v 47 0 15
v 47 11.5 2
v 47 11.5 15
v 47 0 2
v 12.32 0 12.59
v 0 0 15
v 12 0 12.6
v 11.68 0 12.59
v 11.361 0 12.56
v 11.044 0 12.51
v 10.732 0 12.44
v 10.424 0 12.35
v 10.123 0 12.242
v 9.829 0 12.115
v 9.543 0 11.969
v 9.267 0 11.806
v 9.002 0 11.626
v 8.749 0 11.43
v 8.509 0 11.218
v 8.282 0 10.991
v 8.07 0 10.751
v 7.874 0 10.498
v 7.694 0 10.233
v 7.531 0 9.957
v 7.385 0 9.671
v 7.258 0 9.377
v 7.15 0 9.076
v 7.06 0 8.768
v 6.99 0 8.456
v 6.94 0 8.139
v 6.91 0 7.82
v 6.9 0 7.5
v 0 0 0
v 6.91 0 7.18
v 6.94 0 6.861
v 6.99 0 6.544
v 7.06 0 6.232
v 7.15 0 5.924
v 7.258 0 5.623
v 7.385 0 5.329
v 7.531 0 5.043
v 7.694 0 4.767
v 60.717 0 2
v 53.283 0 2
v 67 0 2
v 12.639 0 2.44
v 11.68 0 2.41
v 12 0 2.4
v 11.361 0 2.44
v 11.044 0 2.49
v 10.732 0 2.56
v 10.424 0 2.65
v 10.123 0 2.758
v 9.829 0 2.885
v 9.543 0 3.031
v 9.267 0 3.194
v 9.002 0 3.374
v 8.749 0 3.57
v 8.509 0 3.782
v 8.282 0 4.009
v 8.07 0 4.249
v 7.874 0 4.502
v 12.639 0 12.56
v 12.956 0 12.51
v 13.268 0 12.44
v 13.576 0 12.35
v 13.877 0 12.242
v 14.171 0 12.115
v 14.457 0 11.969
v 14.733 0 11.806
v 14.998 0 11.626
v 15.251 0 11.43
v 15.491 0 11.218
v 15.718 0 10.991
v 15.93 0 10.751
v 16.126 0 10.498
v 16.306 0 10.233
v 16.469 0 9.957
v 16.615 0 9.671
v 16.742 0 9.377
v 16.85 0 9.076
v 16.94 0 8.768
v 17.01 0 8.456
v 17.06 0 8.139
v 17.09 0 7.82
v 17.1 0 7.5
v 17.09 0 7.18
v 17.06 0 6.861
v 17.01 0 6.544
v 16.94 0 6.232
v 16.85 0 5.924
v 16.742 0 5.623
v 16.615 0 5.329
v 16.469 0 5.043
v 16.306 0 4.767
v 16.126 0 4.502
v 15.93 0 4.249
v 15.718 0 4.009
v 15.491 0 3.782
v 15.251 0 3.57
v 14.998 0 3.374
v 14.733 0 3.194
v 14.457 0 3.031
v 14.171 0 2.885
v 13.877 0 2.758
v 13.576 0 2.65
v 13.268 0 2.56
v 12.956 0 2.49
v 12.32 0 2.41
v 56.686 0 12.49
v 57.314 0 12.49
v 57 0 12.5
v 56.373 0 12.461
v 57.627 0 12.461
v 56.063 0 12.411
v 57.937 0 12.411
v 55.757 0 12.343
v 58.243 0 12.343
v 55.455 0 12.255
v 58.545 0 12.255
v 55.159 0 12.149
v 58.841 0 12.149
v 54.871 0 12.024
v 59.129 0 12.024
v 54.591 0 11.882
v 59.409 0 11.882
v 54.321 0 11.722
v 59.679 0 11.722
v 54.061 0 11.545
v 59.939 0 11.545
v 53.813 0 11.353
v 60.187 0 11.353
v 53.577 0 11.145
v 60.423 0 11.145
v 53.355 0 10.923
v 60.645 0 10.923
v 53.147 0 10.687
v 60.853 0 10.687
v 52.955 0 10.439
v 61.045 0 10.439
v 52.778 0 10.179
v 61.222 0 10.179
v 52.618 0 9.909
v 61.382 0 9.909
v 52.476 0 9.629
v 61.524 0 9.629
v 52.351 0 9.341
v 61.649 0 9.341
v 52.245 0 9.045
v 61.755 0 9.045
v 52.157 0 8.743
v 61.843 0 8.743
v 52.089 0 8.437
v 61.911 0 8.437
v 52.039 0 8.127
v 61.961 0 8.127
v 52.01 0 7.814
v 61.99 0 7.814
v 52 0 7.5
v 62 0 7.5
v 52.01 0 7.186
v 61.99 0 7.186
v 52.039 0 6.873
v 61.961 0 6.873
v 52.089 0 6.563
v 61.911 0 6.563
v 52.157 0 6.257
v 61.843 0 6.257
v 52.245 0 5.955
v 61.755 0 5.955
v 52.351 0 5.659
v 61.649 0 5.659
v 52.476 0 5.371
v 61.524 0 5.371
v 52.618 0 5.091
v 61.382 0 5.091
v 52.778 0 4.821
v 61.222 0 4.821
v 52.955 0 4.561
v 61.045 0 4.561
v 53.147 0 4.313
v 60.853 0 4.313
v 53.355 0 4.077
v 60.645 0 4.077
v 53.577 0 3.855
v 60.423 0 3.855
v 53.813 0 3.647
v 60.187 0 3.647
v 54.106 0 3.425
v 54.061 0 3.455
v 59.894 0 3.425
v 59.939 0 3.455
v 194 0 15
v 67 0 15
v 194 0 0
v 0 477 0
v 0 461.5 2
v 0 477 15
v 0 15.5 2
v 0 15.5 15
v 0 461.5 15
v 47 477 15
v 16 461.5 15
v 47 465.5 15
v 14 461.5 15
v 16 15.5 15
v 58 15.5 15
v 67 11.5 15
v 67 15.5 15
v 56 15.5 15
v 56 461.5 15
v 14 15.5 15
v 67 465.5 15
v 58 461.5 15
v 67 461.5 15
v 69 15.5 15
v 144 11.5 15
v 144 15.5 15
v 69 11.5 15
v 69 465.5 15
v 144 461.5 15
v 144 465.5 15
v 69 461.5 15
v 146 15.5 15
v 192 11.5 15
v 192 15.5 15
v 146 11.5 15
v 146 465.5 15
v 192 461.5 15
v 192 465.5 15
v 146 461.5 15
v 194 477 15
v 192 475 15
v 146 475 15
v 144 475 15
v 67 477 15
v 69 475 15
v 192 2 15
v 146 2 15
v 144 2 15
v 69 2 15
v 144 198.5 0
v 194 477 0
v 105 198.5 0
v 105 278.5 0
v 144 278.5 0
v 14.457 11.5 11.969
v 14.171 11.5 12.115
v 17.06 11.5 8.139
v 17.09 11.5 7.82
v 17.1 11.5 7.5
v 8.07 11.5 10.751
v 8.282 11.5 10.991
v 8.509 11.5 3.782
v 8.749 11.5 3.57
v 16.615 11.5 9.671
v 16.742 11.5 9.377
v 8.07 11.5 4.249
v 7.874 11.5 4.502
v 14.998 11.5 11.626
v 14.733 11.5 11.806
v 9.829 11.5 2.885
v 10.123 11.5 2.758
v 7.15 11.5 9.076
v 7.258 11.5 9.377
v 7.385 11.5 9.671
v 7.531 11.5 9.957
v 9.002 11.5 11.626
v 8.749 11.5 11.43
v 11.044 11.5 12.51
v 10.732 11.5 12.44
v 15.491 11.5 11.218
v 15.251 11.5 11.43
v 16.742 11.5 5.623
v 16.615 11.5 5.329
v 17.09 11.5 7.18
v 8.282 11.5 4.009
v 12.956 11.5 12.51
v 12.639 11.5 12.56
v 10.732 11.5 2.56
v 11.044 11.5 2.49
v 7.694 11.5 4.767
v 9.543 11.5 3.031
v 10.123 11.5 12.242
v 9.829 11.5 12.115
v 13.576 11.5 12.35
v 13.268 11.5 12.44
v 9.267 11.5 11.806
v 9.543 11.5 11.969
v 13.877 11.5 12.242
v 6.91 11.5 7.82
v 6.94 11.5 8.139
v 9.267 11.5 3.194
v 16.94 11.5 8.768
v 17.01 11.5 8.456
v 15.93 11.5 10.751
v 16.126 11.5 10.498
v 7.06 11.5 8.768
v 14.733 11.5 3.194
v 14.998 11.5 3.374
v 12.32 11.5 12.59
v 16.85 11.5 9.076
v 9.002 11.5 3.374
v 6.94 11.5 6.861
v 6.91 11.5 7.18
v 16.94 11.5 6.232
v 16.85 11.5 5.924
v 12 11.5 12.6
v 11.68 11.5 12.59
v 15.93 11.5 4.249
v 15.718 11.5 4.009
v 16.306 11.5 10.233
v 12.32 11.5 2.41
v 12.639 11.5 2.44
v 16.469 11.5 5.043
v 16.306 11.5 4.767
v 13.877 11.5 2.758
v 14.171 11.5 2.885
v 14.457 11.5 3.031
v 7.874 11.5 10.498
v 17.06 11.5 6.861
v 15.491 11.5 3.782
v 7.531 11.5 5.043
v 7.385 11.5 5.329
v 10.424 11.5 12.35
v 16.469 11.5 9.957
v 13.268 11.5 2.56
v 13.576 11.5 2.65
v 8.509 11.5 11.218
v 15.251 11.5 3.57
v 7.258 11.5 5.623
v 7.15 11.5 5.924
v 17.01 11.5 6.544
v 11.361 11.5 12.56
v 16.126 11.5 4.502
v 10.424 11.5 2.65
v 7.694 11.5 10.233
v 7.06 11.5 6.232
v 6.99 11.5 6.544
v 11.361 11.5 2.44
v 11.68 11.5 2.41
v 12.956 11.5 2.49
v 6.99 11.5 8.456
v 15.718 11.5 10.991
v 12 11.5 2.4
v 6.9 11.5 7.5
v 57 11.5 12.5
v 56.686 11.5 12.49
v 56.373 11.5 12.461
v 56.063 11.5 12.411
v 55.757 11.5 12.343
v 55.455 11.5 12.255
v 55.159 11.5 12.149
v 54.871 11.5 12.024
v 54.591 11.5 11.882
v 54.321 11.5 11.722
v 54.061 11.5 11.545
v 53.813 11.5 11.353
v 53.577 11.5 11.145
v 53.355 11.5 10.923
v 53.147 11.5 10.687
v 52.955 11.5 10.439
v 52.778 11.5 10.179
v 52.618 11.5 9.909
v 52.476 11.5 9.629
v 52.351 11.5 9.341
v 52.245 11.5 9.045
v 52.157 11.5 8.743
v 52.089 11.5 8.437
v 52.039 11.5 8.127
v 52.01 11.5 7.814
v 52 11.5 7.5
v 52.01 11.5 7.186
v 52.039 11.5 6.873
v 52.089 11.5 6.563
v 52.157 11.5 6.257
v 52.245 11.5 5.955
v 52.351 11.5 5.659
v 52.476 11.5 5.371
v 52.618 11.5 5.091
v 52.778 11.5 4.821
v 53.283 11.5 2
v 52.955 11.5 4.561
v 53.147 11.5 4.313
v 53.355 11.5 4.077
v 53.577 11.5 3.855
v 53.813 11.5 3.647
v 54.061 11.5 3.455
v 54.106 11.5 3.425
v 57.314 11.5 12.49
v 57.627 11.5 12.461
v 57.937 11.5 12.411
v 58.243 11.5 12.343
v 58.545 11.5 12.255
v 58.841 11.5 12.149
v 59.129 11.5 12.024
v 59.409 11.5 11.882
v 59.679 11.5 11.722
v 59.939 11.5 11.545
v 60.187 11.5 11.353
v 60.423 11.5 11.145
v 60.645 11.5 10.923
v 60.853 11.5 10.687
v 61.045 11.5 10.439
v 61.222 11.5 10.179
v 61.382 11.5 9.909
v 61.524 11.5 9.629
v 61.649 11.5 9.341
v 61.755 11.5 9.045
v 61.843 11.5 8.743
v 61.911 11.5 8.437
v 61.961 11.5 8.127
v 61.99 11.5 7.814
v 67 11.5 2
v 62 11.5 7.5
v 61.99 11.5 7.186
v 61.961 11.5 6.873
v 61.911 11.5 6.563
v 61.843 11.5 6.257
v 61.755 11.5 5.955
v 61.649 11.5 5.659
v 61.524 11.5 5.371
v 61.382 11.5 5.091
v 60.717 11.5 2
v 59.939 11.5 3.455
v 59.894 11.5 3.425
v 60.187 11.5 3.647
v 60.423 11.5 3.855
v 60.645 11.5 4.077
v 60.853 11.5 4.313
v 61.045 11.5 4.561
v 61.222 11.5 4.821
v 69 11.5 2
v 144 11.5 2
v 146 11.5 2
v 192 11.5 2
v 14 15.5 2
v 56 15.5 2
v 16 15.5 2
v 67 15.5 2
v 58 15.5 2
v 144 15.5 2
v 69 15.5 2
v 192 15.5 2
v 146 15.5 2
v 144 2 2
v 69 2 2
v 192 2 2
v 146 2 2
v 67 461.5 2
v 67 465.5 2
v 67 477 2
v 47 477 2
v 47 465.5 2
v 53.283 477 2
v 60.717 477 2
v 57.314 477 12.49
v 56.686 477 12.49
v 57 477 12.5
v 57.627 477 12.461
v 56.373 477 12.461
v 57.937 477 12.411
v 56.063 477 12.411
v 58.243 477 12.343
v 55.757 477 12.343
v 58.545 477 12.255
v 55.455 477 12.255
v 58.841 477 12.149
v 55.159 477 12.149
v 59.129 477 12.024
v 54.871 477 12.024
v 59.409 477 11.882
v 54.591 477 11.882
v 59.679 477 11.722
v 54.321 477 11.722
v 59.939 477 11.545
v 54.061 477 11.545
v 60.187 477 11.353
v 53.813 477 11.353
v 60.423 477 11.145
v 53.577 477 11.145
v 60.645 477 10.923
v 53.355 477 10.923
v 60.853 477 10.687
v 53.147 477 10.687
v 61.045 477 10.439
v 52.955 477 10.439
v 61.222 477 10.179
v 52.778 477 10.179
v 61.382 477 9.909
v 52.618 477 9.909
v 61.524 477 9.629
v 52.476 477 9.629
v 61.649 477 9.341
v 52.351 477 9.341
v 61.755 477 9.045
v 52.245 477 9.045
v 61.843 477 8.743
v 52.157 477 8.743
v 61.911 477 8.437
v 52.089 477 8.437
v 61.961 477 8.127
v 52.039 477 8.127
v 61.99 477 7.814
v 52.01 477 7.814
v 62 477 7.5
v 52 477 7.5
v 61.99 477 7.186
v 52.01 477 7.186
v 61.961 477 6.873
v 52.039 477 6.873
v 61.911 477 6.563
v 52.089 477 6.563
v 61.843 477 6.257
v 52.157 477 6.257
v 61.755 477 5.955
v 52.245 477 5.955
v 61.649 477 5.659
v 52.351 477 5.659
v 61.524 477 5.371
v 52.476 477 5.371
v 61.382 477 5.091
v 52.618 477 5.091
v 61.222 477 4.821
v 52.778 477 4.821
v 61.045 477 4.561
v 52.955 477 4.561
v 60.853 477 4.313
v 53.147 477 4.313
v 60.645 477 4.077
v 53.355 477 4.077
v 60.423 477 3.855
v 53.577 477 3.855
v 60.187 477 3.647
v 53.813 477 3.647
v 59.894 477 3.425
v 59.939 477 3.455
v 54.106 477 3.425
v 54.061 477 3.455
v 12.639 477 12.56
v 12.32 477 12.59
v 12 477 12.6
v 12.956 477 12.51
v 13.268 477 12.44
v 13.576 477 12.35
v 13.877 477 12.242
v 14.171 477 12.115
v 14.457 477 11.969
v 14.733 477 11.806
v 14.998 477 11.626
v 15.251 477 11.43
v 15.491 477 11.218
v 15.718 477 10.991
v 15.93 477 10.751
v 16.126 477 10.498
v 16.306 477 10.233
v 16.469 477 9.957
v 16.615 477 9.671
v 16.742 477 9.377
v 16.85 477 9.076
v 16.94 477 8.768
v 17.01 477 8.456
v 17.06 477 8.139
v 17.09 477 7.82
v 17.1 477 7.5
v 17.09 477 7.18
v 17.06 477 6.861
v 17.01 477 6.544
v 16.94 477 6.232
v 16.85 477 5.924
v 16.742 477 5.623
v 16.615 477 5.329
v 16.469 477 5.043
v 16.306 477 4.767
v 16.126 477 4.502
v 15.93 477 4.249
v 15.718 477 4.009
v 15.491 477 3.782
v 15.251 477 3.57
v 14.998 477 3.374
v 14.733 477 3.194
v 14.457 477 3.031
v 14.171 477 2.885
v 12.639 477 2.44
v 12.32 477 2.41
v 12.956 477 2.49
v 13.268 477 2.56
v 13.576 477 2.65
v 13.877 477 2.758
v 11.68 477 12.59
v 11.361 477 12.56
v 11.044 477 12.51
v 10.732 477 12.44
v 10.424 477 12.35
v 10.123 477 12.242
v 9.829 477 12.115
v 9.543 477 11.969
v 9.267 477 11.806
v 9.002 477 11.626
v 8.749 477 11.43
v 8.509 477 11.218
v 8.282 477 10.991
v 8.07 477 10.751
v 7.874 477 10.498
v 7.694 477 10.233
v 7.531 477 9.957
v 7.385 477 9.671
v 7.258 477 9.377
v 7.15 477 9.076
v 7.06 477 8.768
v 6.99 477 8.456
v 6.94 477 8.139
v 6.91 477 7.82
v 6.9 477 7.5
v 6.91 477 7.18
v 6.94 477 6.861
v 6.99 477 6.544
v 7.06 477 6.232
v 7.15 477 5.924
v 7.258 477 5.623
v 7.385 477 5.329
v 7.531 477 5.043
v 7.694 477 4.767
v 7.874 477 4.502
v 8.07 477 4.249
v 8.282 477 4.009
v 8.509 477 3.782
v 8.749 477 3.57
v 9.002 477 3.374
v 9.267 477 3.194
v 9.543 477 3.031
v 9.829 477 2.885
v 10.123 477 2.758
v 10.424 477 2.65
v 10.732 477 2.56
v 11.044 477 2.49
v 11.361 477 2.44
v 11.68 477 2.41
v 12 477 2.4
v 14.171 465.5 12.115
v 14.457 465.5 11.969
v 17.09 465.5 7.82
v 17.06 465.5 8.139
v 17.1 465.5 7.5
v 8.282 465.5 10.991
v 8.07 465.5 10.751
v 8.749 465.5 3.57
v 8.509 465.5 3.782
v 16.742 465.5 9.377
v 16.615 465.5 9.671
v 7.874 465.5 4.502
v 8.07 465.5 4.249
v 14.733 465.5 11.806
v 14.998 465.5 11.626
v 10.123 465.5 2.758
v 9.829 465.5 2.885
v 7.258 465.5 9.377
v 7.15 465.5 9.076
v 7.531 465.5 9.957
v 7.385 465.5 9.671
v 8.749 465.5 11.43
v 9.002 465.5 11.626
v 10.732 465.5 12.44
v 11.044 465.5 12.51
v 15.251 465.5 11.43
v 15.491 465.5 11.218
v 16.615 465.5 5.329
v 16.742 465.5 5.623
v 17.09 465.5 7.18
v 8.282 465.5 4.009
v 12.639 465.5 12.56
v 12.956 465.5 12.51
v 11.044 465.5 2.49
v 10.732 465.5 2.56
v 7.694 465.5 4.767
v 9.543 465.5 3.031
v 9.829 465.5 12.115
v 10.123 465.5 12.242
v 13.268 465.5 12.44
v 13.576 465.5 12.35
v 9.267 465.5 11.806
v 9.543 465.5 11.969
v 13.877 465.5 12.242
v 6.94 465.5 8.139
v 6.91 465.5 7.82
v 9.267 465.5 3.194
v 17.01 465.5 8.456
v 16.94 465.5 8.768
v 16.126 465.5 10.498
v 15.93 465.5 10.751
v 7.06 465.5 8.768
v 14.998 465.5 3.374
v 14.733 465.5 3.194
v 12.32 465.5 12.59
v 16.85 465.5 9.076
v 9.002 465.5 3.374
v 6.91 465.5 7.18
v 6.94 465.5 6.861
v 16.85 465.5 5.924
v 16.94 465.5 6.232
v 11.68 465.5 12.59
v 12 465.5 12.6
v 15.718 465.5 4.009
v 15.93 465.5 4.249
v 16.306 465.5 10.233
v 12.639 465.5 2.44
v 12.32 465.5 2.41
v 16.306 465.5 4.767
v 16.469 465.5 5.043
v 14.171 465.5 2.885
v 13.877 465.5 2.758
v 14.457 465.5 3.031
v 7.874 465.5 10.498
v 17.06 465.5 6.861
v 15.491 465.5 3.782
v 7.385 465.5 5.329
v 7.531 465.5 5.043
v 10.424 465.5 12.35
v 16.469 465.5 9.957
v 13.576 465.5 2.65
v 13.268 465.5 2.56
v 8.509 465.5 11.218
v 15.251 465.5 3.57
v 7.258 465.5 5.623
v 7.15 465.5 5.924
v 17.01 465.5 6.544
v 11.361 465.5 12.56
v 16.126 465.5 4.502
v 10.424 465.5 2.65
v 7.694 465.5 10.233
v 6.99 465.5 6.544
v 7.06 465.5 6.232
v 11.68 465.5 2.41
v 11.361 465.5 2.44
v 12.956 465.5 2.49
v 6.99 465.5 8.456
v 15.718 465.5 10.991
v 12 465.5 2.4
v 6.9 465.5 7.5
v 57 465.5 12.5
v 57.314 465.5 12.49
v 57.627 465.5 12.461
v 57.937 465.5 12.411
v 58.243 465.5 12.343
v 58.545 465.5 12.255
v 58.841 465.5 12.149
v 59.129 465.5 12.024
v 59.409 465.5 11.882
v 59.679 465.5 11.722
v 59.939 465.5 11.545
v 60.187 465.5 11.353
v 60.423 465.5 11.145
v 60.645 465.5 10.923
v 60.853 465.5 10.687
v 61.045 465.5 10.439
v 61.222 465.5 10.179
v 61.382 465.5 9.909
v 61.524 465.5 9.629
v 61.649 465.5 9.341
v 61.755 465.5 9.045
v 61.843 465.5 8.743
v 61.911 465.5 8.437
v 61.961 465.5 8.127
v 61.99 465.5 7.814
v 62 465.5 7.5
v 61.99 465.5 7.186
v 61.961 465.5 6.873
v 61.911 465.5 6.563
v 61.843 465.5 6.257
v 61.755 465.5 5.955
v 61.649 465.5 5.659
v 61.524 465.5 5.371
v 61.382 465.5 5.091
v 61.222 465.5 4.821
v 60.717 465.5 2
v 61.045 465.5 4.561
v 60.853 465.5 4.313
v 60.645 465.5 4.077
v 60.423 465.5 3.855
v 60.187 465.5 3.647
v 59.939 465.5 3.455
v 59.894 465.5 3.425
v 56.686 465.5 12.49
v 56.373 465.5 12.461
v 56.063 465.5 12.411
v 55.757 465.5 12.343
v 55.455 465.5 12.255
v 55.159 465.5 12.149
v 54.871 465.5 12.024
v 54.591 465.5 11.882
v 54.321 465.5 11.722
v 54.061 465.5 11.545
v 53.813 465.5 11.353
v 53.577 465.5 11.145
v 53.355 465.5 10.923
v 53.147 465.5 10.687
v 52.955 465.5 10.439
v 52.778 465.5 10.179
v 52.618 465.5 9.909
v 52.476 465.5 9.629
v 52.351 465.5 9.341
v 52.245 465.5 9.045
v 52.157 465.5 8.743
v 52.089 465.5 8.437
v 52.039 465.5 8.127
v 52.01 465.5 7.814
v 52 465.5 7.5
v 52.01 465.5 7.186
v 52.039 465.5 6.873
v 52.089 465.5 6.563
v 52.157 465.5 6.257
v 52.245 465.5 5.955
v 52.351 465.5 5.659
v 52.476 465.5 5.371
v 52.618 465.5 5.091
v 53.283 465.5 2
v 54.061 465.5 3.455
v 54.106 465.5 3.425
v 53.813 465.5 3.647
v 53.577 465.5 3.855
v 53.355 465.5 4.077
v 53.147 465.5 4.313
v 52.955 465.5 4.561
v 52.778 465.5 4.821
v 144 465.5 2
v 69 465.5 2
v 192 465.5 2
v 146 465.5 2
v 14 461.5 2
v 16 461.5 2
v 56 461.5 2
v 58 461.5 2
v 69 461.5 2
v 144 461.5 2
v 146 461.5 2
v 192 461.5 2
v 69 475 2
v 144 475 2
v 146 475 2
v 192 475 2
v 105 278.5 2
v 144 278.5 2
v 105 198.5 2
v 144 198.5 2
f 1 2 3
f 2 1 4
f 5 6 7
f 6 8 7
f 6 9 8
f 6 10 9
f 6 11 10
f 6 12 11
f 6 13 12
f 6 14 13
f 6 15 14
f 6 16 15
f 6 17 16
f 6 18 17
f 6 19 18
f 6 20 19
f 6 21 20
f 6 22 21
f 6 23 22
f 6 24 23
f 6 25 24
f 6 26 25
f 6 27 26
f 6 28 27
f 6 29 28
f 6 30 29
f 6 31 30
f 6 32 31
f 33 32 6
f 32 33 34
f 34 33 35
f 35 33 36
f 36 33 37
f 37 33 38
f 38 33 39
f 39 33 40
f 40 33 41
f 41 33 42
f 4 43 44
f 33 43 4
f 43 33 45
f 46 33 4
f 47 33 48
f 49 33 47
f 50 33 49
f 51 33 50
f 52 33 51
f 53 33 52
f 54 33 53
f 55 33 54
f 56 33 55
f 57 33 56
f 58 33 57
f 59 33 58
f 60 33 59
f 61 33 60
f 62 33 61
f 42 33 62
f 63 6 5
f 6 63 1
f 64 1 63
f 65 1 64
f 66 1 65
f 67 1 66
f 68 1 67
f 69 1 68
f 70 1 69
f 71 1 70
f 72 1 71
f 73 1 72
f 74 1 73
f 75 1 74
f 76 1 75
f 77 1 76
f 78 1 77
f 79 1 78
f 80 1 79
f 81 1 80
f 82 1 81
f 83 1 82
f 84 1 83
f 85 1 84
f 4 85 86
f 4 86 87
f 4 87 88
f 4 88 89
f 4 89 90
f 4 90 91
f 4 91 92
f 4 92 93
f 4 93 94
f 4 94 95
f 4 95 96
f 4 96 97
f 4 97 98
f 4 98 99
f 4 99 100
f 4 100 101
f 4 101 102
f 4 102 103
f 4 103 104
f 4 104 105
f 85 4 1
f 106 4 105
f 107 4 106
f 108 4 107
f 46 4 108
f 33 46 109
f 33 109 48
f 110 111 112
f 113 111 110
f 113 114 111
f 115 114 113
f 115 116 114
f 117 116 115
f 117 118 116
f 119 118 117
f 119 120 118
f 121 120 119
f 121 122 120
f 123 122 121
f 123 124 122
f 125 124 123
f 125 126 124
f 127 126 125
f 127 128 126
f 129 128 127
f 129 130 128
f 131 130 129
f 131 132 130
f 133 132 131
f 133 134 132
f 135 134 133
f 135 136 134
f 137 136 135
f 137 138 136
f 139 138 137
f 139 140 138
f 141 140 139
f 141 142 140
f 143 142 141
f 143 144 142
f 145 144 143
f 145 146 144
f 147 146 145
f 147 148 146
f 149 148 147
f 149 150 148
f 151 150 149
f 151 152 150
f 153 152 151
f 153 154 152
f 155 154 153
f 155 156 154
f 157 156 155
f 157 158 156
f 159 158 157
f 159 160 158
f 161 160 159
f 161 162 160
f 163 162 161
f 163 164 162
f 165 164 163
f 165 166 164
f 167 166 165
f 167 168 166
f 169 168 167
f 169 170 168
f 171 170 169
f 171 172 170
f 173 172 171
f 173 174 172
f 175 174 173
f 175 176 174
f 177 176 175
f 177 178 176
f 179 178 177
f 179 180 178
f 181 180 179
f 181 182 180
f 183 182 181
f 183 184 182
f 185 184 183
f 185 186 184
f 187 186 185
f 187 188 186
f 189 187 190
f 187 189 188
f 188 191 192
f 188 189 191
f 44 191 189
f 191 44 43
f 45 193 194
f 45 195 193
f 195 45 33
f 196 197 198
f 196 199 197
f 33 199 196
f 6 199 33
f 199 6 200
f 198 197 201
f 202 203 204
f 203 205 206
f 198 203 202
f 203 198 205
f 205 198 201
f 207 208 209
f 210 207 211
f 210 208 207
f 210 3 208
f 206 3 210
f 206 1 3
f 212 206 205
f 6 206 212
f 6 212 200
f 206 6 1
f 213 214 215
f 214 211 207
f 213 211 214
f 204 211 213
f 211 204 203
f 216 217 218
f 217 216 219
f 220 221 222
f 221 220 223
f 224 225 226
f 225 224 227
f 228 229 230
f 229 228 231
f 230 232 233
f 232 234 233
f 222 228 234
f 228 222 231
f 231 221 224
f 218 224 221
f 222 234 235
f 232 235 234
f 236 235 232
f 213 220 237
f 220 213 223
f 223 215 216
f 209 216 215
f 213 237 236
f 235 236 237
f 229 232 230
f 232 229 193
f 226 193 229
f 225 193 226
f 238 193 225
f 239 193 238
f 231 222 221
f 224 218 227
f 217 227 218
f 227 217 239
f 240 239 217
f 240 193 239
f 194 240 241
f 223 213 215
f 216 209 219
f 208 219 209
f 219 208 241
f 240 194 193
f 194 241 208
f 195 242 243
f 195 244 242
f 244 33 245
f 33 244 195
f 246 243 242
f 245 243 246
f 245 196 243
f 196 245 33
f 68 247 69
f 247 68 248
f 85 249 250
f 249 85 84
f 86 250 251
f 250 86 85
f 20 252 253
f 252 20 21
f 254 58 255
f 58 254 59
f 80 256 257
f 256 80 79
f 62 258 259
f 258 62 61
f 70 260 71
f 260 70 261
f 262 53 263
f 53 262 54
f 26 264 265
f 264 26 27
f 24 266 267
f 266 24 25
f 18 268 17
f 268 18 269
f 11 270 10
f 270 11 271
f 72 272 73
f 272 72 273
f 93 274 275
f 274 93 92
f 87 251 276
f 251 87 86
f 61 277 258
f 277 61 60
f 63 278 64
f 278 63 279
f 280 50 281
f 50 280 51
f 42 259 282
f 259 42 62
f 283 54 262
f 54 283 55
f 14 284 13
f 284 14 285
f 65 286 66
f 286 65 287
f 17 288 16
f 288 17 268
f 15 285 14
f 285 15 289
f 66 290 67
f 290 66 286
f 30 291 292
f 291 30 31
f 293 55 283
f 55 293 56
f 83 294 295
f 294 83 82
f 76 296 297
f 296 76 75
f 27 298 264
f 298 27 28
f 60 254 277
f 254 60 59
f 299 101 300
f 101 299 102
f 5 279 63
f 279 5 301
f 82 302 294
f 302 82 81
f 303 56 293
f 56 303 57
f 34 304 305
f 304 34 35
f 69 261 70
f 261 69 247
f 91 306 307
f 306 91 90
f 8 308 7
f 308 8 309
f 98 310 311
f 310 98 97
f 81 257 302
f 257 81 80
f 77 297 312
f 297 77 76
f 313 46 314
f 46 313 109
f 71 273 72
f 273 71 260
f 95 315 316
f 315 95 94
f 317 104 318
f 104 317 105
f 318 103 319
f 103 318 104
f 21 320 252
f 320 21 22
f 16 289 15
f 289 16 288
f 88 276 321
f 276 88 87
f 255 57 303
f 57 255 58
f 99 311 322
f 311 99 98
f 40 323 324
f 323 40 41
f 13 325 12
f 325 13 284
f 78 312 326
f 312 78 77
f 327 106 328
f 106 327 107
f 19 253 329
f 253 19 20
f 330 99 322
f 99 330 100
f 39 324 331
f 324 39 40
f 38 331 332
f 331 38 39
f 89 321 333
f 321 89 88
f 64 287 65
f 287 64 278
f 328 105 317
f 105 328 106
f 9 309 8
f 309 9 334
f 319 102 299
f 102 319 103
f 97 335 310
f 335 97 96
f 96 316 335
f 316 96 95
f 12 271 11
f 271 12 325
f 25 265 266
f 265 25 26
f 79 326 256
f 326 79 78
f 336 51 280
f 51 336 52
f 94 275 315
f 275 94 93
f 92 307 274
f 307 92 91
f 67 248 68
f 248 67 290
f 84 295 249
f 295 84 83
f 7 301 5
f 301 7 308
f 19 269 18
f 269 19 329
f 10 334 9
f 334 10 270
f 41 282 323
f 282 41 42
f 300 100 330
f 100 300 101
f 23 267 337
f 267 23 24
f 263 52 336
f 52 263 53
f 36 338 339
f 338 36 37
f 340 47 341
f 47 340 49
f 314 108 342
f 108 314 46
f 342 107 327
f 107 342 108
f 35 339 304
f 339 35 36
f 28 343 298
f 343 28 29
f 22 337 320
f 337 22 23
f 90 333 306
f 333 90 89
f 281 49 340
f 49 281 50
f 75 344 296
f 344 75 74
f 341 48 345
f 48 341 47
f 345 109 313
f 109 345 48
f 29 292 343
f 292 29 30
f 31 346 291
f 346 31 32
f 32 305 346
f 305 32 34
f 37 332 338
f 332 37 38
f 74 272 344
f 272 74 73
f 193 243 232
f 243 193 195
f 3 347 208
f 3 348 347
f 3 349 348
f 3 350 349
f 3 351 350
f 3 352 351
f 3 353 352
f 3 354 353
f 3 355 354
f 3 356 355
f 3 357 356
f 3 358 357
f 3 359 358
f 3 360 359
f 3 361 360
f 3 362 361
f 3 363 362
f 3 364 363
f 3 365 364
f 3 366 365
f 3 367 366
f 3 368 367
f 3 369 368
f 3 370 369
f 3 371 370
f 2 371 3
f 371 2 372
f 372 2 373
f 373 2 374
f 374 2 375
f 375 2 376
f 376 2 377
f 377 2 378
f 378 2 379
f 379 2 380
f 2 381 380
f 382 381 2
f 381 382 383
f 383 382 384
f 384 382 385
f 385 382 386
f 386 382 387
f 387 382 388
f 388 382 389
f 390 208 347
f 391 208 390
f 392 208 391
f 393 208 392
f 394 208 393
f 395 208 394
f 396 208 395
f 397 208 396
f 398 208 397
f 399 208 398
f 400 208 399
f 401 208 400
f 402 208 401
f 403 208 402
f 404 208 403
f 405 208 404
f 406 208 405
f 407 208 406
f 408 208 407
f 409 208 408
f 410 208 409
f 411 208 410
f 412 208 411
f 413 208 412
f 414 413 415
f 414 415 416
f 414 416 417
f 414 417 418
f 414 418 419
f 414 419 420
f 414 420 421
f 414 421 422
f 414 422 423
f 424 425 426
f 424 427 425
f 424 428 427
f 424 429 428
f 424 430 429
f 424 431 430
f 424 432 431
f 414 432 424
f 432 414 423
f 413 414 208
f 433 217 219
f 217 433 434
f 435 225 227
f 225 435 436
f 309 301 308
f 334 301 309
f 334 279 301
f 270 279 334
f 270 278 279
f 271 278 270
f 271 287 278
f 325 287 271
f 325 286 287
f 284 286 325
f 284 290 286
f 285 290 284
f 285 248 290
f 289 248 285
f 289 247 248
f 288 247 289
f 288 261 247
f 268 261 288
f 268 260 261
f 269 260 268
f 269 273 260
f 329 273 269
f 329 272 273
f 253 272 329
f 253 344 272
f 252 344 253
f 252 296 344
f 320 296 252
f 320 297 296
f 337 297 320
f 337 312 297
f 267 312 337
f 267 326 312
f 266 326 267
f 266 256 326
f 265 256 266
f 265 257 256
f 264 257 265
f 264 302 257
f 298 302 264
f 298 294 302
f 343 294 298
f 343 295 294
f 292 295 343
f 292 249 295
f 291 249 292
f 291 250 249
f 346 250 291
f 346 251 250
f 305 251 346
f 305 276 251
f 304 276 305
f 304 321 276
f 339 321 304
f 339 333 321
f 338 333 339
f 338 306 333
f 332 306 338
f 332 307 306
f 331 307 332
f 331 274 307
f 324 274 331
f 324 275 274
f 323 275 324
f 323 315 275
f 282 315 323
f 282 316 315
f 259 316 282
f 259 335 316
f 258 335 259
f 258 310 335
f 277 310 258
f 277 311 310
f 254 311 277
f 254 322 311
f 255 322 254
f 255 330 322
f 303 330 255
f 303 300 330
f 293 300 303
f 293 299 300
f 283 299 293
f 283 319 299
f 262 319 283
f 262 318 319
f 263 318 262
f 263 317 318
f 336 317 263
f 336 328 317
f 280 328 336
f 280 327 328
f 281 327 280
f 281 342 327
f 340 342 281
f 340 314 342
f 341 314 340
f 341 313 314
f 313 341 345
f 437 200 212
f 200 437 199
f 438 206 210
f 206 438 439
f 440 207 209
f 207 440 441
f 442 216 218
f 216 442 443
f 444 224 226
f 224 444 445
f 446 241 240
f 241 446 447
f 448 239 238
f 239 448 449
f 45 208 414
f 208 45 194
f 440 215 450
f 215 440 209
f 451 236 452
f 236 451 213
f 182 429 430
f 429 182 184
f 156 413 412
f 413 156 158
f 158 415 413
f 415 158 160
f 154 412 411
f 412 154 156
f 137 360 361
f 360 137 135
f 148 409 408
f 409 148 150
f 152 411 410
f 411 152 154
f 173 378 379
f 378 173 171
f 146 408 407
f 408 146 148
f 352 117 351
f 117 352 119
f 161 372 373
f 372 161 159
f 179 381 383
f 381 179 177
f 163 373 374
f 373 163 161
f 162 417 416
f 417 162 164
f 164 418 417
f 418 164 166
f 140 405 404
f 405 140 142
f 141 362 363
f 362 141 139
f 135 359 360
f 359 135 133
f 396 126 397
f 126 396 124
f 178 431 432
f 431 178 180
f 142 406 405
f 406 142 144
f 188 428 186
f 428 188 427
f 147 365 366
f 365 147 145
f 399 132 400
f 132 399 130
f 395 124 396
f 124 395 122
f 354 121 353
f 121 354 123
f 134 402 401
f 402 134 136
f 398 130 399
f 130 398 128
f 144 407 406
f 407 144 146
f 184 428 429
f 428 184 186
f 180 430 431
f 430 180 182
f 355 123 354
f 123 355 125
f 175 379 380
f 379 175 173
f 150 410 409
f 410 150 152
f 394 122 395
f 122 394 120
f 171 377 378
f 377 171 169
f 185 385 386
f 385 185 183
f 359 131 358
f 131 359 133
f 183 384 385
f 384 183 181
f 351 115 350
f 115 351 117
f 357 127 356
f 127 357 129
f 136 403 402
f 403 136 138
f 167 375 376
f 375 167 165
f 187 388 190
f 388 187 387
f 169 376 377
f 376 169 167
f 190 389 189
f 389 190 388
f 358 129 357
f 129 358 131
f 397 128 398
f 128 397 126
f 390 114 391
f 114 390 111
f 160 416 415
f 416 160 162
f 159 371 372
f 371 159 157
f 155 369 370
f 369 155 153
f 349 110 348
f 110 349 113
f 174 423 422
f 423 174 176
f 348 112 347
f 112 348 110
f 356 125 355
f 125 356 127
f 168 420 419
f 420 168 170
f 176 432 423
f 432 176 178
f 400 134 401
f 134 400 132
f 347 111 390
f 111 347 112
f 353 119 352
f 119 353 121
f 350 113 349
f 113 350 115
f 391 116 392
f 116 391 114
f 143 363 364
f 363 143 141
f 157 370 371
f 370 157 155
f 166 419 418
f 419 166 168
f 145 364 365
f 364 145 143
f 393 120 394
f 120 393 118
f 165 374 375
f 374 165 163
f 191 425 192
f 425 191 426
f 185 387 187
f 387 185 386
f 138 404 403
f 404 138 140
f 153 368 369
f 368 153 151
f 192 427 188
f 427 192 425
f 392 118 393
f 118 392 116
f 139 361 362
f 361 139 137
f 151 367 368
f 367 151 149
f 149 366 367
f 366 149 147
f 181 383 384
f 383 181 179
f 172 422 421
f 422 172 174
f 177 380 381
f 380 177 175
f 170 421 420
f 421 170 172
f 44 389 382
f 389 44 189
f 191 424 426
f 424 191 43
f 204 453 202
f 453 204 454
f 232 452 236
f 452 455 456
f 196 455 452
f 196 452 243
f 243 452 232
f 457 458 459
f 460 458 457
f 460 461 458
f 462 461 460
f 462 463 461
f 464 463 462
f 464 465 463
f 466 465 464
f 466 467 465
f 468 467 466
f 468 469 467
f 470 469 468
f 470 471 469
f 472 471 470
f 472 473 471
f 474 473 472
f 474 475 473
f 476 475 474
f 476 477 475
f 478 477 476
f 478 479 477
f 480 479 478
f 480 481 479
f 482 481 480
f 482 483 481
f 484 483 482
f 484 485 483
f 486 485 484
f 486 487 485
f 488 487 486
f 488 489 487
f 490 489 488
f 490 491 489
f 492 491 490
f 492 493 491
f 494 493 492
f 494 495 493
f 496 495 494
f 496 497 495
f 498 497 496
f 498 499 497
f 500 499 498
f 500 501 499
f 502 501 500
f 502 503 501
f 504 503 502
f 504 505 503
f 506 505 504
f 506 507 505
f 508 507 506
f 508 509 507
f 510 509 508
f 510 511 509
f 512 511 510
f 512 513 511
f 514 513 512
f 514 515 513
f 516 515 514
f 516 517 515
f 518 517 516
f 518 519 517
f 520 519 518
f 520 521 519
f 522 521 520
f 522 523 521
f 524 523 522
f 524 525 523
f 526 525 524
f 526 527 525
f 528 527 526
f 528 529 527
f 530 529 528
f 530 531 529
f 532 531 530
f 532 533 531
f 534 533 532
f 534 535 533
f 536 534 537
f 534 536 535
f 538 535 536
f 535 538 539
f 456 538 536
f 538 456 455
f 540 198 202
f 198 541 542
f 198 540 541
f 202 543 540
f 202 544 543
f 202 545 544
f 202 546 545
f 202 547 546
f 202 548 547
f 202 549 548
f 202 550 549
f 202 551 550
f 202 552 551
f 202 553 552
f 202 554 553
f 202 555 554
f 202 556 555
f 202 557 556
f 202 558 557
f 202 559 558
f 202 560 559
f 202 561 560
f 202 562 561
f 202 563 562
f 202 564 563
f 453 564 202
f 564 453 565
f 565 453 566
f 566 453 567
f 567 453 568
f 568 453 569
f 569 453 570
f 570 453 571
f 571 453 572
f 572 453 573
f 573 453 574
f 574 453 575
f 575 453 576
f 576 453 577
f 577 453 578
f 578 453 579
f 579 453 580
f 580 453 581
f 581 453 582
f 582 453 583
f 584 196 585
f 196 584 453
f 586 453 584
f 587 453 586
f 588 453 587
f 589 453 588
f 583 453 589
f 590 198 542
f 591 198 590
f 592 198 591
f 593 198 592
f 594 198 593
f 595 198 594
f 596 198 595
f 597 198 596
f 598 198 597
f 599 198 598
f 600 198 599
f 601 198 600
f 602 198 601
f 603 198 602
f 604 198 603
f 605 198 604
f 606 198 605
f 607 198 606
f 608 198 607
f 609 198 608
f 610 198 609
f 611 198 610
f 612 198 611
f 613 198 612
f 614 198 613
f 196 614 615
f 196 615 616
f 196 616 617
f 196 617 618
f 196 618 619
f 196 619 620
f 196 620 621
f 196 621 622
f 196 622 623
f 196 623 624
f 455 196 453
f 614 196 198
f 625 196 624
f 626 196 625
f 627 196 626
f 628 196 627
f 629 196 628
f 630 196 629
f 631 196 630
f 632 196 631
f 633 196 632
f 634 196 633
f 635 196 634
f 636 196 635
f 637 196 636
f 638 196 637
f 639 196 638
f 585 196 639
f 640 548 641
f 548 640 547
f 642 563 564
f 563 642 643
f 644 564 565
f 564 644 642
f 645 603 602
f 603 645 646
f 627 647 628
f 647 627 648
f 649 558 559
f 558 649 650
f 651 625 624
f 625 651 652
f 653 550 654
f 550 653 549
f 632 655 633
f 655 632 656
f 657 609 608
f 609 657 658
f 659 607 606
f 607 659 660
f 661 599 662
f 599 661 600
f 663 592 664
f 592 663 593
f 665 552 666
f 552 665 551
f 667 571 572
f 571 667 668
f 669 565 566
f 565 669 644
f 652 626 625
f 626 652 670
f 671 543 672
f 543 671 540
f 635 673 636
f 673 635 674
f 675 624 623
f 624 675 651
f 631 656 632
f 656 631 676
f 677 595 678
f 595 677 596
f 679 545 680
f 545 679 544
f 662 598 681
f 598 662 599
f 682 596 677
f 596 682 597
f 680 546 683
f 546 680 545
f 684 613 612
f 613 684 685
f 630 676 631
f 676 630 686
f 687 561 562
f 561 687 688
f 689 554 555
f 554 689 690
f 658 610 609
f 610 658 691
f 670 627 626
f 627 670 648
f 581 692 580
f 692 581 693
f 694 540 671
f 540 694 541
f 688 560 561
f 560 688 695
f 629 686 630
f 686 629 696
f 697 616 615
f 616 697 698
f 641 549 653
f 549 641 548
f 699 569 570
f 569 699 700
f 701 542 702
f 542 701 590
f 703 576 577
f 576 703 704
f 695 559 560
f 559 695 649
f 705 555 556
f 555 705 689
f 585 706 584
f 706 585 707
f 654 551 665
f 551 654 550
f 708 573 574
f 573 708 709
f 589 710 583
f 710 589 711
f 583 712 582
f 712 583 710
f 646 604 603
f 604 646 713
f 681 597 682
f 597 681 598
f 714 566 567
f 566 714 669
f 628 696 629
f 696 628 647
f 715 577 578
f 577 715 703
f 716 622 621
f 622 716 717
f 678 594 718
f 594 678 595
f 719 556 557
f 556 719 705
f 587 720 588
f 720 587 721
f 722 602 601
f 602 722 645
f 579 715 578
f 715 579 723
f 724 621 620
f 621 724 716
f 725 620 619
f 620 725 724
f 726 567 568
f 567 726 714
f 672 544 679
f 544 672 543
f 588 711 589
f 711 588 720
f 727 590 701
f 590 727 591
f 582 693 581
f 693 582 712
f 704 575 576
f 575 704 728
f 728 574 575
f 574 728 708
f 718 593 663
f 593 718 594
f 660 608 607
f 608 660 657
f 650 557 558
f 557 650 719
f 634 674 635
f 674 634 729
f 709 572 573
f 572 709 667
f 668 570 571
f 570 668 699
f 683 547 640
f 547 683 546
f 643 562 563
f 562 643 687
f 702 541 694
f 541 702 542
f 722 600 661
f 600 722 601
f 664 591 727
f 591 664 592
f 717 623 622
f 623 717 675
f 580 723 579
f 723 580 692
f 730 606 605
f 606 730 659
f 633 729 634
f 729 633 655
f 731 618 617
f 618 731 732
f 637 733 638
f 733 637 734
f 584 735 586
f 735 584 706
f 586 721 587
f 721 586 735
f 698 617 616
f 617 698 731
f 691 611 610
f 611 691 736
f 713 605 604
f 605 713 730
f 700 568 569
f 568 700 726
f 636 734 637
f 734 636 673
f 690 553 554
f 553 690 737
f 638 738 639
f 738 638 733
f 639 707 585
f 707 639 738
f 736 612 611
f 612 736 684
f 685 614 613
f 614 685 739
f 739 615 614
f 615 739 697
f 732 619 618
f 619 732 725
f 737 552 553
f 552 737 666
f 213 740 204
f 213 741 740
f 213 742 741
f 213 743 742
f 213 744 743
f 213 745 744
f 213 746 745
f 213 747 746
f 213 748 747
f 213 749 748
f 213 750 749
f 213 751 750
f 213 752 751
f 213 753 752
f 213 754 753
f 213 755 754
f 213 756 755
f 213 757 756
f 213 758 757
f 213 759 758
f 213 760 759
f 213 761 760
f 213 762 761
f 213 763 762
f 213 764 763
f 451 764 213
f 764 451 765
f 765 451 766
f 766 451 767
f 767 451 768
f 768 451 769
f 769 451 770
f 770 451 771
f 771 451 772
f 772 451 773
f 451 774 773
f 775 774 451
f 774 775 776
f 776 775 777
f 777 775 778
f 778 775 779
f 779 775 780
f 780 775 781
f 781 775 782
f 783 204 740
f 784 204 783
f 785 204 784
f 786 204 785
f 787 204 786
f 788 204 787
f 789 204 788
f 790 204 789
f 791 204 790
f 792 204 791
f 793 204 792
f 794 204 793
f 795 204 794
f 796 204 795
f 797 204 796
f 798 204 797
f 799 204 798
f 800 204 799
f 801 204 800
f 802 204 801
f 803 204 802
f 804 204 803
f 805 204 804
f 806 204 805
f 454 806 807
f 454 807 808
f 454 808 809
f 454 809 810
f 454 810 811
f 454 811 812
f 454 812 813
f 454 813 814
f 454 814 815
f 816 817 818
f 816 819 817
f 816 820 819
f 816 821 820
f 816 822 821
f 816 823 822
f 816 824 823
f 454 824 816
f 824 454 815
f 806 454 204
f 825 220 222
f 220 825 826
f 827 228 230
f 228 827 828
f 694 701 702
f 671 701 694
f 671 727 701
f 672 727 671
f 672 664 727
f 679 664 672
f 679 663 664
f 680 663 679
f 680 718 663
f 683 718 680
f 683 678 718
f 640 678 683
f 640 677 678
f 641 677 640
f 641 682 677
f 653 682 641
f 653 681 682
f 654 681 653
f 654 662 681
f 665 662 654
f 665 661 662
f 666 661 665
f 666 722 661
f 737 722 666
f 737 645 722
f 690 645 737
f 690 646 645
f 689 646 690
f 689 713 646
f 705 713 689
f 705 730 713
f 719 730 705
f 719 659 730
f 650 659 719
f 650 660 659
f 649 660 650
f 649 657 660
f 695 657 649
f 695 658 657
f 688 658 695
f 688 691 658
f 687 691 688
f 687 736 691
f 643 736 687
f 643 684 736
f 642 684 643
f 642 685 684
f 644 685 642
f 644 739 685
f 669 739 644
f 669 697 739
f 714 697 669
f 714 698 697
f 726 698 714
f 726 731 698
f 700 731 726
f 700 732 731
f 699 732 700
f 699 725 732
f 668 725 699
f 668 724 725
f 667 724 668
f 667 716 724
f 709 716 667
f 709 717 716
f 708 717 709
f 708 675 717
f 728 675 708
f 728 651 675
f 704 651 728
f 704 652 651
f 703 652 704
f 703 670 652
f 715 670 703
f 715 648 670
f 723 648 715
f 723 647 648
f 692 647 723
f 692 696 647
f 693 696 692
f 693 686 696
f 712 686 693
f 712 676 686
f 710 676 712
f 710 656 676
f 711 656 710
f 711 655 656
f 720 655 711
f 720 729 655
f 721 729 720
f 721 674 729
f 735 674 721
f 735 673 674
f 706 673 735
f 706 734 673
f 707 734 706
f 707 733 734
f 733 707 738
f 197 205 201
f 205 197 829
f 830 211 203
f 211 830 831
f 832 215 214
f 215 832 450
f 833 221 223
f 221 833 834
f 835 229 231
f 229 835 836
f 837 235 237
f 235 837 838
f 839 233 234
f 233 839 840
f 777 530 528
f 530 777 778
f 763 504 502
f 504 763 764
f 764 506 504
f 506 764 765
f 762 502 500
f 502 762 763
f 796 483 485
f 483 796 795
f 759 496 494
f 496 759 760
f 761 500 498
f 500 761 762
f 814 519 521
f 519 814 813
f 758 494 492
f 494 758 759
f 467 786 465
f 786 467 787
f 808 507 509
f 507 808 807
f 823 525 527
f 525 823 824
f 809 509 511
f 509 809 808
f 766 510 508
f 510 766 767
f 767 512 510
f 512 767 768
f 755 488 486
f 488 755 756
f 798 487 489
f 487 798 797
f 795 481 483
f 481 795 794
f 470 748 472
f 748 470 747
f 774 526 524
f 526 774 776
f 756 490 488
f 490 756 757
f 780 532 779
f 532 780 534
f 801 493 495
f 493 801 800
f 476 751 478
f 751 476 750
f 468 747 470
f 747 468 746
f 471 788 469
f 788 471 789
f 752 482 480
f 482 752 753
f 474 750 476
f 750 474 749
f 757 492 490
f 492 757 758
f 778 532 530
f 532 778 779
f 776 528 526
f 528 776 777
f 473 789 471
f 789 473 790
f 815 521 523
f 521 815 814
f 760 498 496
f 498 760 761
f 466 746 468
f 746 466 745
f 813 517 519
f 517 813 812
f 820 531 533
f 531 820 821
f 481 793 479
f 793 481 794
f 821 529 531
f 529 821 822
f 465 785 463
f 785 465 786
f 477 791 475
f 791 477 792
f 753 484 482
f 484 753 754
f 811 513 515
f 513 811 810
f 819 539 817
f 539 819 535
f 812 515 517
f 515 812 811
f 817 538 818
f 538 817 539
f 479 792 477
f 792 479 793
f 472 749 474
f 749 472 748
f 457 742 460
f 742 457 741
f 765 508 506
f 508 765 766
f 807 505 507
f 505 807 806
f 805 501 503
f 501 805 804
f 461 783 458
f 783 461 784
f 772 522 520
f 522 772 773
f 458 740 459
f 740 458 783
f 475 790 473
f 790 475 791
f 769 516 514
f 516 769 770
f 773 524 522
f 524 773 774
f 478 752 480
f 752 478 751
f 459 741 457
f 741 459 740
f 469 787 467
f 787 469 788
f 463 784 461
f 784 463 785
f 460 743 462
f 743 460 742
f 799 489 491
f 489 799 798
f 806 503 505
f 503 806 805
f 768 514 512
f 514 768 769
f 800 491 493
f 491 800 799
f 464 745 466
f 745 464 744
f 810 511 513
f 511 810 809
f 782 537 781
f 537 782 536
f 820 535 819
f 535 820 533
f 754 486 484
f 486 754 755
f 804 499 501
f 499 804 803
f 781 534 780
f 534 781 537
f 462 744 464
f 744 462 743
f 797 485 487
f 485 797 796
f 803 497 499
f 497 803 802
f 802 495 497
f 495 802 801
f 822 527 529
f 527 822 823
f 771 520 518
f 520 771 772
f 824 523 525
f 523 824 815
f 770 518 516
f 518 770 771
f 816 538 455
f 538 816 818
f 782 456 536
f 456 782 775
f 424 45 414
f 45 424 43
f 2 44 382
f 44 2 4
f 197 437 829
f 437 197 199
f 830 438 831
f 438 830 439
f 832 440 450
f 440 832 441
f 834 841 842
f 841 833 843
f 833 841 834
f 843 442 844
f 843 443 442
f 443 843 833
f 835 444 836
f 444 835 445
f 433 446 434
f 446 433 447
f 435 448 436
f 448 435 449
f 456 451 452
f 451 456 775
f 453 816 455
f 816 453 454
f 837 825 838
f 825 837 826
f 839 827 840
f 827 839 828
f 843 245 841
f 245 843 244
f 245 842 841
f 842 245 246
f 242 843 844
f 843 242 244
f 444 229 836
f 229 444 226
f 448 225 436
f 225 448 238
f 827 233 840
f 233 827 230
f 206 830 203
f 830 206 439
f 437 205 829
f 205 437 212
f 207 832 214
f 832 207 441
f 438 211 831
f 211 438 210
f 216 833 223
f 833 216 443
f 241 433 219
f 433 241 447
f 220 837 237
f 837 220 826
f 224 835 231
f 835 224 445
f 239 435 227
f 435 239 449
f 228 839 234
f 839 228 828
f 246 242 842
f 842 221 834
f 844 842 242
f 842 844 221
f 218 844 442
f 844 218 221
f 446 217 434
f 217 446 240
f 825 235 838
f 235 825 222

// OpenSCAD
//freezer drawer cover

left =1;
right=1;
mid  =1;

$fn = 100;
wall = 2;
hingeWidth = 13.5;
hingeHeight = 15;
hingeLength = 67;

cylinder1 = 12;
cylinder2 = 45+12;
support1 = 145;
support2 = hingeLength;

width = 477;
height = 194;

sqrt2=1.4142135623730950488016887242097;

if (left) leftPart();
if (right) rightPart();
if (mid) midPart();

module rightPart(){
    difference(){
        toPrint();
        rightCut();
    }
}

module leftPart(){
    difference(){
        toPrint();
        leftCut();
    }
}

module midPart(){
    difference(){
        toPrint();
        midCut();
    }
}

module rightCut(){
    translate([height/2,0,0]) cube([2*height,width,width],center=true);
    difference(){
        translate([height/2,width,0]) cube([2*height,2*width,width],center=true);       
        midCut();
    }
}

module leftCut(){
    translate([height/2,width,0]) cube([2*height,width,width],center=true);
    difference(){
        translate([height/2,width,0]) cube([2*height,2*width,width],center=true);       
        midCut();
    }
}

module midCut(){
    difference(){
        translate([height/2,width/2,0]) cube([2*height,2*width,width],center=true);
        translate([height*.75,width/2,hingeHeight/2]) rotate([45,0,0]) cube([height*3,width/3/sqrt2,width/3/sqrt2],center=true);
    }
}

module toPrint(){
    hinge();
    translate([0,width,0]) mirror([0,1,0]) hinge();
    frame();
    supports();
}

module hinge(){
    width = hingeWidth;
    heightH = hingeHeight;
    length = hingeLength;
    
    translate([0,hingeWidth,0]) rotate([90,0,0]){
        difference(){
            cube([47,heightH,width]);
            translate([cylinder1,heightH/2,-1]) cylinder(h = width+2, r = 5.1);
        }
        translate([0,0,-wall]) cube([height,heightH,2*wall]);                
        translate([hingeLength,0,width-wall]) cube([height-hingeLength,heightH,wall]);                
        translate([cylinder2,width-6,0]) cylinder(h = width, r = 5);
        // triangle
        translate([cylinder2,0.75*(width-6)/2,0]) rotate([0,0,90]) cylinder(r=0.75*(width-6),h=width,$fn=3);
    }
}

module supports(){
    translate([15-wall/2,hingeWidth,0]) cube([wall,width-2*hingeWidth,hingeHeight]);
    translate([cylinder2-wall/2,hingeWidth,0]) cube([wall,width-2*hingeWidth,hingeHeight]);
    translate([support2,0,0]) cube([wall,width,hingeHeight]);
    translate([support1-wall/2,0,0]) cube([wall,width,hingeHeight]);    
}

module frame(){
    translate([height-wall,0,0]) cube([wall,width,hingeHeight]);
    difference(){
        cube([height,width,wall]);
        // handle
        translate([support1-40,width/2-80/2,-wall]) cube([40,80,3*wall]);
    }
}    
